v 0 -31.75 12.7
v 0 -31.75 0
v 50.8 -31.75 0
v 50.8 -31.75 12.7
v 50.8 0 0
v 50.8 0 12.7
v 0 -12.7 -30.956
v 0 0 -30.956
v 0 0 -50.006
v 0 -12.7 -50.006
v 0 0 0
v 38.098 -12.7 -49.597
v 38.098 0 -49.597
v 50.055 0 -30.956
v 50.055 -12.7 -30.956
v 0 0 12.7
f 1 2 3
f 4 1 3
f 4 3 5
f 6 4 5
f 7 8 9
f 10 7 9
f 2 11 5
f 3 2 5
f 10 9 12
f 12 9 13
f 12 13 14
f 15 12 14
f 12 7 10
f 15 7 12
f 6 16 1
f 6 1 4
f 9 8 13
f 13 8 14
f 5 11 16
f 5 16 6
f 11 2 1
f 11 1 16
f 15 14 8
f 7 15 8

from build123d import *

# Parameters (mm, degrees)
F0_W     = 50.8
F0_H     = 31.75
F1_DEPTH = 12.7
F3_DEPTH = 12.7


with BuildPart() as f1:
    # F0 (on Top) → F1 (new body)
    with BuildSketch(Plane.XY):
        with Locations((25.4, -15.875)):
            Rectangle(F0_W, F0_H)
    extrude(amount=F1_DEPTH)


with BuildPart() as f3:
    # F2 (on Front) → F3 (new body)
    with BuildSketch(Plane.XZ):
        Polygon((0, -30.956252), (0, -50.006252), (38.097797, -49.59653), (50.054726, -30.956252), align=None)
    extrude(amount=F3_DEPTH)


solid = Compound([f1.part, f3.part])
